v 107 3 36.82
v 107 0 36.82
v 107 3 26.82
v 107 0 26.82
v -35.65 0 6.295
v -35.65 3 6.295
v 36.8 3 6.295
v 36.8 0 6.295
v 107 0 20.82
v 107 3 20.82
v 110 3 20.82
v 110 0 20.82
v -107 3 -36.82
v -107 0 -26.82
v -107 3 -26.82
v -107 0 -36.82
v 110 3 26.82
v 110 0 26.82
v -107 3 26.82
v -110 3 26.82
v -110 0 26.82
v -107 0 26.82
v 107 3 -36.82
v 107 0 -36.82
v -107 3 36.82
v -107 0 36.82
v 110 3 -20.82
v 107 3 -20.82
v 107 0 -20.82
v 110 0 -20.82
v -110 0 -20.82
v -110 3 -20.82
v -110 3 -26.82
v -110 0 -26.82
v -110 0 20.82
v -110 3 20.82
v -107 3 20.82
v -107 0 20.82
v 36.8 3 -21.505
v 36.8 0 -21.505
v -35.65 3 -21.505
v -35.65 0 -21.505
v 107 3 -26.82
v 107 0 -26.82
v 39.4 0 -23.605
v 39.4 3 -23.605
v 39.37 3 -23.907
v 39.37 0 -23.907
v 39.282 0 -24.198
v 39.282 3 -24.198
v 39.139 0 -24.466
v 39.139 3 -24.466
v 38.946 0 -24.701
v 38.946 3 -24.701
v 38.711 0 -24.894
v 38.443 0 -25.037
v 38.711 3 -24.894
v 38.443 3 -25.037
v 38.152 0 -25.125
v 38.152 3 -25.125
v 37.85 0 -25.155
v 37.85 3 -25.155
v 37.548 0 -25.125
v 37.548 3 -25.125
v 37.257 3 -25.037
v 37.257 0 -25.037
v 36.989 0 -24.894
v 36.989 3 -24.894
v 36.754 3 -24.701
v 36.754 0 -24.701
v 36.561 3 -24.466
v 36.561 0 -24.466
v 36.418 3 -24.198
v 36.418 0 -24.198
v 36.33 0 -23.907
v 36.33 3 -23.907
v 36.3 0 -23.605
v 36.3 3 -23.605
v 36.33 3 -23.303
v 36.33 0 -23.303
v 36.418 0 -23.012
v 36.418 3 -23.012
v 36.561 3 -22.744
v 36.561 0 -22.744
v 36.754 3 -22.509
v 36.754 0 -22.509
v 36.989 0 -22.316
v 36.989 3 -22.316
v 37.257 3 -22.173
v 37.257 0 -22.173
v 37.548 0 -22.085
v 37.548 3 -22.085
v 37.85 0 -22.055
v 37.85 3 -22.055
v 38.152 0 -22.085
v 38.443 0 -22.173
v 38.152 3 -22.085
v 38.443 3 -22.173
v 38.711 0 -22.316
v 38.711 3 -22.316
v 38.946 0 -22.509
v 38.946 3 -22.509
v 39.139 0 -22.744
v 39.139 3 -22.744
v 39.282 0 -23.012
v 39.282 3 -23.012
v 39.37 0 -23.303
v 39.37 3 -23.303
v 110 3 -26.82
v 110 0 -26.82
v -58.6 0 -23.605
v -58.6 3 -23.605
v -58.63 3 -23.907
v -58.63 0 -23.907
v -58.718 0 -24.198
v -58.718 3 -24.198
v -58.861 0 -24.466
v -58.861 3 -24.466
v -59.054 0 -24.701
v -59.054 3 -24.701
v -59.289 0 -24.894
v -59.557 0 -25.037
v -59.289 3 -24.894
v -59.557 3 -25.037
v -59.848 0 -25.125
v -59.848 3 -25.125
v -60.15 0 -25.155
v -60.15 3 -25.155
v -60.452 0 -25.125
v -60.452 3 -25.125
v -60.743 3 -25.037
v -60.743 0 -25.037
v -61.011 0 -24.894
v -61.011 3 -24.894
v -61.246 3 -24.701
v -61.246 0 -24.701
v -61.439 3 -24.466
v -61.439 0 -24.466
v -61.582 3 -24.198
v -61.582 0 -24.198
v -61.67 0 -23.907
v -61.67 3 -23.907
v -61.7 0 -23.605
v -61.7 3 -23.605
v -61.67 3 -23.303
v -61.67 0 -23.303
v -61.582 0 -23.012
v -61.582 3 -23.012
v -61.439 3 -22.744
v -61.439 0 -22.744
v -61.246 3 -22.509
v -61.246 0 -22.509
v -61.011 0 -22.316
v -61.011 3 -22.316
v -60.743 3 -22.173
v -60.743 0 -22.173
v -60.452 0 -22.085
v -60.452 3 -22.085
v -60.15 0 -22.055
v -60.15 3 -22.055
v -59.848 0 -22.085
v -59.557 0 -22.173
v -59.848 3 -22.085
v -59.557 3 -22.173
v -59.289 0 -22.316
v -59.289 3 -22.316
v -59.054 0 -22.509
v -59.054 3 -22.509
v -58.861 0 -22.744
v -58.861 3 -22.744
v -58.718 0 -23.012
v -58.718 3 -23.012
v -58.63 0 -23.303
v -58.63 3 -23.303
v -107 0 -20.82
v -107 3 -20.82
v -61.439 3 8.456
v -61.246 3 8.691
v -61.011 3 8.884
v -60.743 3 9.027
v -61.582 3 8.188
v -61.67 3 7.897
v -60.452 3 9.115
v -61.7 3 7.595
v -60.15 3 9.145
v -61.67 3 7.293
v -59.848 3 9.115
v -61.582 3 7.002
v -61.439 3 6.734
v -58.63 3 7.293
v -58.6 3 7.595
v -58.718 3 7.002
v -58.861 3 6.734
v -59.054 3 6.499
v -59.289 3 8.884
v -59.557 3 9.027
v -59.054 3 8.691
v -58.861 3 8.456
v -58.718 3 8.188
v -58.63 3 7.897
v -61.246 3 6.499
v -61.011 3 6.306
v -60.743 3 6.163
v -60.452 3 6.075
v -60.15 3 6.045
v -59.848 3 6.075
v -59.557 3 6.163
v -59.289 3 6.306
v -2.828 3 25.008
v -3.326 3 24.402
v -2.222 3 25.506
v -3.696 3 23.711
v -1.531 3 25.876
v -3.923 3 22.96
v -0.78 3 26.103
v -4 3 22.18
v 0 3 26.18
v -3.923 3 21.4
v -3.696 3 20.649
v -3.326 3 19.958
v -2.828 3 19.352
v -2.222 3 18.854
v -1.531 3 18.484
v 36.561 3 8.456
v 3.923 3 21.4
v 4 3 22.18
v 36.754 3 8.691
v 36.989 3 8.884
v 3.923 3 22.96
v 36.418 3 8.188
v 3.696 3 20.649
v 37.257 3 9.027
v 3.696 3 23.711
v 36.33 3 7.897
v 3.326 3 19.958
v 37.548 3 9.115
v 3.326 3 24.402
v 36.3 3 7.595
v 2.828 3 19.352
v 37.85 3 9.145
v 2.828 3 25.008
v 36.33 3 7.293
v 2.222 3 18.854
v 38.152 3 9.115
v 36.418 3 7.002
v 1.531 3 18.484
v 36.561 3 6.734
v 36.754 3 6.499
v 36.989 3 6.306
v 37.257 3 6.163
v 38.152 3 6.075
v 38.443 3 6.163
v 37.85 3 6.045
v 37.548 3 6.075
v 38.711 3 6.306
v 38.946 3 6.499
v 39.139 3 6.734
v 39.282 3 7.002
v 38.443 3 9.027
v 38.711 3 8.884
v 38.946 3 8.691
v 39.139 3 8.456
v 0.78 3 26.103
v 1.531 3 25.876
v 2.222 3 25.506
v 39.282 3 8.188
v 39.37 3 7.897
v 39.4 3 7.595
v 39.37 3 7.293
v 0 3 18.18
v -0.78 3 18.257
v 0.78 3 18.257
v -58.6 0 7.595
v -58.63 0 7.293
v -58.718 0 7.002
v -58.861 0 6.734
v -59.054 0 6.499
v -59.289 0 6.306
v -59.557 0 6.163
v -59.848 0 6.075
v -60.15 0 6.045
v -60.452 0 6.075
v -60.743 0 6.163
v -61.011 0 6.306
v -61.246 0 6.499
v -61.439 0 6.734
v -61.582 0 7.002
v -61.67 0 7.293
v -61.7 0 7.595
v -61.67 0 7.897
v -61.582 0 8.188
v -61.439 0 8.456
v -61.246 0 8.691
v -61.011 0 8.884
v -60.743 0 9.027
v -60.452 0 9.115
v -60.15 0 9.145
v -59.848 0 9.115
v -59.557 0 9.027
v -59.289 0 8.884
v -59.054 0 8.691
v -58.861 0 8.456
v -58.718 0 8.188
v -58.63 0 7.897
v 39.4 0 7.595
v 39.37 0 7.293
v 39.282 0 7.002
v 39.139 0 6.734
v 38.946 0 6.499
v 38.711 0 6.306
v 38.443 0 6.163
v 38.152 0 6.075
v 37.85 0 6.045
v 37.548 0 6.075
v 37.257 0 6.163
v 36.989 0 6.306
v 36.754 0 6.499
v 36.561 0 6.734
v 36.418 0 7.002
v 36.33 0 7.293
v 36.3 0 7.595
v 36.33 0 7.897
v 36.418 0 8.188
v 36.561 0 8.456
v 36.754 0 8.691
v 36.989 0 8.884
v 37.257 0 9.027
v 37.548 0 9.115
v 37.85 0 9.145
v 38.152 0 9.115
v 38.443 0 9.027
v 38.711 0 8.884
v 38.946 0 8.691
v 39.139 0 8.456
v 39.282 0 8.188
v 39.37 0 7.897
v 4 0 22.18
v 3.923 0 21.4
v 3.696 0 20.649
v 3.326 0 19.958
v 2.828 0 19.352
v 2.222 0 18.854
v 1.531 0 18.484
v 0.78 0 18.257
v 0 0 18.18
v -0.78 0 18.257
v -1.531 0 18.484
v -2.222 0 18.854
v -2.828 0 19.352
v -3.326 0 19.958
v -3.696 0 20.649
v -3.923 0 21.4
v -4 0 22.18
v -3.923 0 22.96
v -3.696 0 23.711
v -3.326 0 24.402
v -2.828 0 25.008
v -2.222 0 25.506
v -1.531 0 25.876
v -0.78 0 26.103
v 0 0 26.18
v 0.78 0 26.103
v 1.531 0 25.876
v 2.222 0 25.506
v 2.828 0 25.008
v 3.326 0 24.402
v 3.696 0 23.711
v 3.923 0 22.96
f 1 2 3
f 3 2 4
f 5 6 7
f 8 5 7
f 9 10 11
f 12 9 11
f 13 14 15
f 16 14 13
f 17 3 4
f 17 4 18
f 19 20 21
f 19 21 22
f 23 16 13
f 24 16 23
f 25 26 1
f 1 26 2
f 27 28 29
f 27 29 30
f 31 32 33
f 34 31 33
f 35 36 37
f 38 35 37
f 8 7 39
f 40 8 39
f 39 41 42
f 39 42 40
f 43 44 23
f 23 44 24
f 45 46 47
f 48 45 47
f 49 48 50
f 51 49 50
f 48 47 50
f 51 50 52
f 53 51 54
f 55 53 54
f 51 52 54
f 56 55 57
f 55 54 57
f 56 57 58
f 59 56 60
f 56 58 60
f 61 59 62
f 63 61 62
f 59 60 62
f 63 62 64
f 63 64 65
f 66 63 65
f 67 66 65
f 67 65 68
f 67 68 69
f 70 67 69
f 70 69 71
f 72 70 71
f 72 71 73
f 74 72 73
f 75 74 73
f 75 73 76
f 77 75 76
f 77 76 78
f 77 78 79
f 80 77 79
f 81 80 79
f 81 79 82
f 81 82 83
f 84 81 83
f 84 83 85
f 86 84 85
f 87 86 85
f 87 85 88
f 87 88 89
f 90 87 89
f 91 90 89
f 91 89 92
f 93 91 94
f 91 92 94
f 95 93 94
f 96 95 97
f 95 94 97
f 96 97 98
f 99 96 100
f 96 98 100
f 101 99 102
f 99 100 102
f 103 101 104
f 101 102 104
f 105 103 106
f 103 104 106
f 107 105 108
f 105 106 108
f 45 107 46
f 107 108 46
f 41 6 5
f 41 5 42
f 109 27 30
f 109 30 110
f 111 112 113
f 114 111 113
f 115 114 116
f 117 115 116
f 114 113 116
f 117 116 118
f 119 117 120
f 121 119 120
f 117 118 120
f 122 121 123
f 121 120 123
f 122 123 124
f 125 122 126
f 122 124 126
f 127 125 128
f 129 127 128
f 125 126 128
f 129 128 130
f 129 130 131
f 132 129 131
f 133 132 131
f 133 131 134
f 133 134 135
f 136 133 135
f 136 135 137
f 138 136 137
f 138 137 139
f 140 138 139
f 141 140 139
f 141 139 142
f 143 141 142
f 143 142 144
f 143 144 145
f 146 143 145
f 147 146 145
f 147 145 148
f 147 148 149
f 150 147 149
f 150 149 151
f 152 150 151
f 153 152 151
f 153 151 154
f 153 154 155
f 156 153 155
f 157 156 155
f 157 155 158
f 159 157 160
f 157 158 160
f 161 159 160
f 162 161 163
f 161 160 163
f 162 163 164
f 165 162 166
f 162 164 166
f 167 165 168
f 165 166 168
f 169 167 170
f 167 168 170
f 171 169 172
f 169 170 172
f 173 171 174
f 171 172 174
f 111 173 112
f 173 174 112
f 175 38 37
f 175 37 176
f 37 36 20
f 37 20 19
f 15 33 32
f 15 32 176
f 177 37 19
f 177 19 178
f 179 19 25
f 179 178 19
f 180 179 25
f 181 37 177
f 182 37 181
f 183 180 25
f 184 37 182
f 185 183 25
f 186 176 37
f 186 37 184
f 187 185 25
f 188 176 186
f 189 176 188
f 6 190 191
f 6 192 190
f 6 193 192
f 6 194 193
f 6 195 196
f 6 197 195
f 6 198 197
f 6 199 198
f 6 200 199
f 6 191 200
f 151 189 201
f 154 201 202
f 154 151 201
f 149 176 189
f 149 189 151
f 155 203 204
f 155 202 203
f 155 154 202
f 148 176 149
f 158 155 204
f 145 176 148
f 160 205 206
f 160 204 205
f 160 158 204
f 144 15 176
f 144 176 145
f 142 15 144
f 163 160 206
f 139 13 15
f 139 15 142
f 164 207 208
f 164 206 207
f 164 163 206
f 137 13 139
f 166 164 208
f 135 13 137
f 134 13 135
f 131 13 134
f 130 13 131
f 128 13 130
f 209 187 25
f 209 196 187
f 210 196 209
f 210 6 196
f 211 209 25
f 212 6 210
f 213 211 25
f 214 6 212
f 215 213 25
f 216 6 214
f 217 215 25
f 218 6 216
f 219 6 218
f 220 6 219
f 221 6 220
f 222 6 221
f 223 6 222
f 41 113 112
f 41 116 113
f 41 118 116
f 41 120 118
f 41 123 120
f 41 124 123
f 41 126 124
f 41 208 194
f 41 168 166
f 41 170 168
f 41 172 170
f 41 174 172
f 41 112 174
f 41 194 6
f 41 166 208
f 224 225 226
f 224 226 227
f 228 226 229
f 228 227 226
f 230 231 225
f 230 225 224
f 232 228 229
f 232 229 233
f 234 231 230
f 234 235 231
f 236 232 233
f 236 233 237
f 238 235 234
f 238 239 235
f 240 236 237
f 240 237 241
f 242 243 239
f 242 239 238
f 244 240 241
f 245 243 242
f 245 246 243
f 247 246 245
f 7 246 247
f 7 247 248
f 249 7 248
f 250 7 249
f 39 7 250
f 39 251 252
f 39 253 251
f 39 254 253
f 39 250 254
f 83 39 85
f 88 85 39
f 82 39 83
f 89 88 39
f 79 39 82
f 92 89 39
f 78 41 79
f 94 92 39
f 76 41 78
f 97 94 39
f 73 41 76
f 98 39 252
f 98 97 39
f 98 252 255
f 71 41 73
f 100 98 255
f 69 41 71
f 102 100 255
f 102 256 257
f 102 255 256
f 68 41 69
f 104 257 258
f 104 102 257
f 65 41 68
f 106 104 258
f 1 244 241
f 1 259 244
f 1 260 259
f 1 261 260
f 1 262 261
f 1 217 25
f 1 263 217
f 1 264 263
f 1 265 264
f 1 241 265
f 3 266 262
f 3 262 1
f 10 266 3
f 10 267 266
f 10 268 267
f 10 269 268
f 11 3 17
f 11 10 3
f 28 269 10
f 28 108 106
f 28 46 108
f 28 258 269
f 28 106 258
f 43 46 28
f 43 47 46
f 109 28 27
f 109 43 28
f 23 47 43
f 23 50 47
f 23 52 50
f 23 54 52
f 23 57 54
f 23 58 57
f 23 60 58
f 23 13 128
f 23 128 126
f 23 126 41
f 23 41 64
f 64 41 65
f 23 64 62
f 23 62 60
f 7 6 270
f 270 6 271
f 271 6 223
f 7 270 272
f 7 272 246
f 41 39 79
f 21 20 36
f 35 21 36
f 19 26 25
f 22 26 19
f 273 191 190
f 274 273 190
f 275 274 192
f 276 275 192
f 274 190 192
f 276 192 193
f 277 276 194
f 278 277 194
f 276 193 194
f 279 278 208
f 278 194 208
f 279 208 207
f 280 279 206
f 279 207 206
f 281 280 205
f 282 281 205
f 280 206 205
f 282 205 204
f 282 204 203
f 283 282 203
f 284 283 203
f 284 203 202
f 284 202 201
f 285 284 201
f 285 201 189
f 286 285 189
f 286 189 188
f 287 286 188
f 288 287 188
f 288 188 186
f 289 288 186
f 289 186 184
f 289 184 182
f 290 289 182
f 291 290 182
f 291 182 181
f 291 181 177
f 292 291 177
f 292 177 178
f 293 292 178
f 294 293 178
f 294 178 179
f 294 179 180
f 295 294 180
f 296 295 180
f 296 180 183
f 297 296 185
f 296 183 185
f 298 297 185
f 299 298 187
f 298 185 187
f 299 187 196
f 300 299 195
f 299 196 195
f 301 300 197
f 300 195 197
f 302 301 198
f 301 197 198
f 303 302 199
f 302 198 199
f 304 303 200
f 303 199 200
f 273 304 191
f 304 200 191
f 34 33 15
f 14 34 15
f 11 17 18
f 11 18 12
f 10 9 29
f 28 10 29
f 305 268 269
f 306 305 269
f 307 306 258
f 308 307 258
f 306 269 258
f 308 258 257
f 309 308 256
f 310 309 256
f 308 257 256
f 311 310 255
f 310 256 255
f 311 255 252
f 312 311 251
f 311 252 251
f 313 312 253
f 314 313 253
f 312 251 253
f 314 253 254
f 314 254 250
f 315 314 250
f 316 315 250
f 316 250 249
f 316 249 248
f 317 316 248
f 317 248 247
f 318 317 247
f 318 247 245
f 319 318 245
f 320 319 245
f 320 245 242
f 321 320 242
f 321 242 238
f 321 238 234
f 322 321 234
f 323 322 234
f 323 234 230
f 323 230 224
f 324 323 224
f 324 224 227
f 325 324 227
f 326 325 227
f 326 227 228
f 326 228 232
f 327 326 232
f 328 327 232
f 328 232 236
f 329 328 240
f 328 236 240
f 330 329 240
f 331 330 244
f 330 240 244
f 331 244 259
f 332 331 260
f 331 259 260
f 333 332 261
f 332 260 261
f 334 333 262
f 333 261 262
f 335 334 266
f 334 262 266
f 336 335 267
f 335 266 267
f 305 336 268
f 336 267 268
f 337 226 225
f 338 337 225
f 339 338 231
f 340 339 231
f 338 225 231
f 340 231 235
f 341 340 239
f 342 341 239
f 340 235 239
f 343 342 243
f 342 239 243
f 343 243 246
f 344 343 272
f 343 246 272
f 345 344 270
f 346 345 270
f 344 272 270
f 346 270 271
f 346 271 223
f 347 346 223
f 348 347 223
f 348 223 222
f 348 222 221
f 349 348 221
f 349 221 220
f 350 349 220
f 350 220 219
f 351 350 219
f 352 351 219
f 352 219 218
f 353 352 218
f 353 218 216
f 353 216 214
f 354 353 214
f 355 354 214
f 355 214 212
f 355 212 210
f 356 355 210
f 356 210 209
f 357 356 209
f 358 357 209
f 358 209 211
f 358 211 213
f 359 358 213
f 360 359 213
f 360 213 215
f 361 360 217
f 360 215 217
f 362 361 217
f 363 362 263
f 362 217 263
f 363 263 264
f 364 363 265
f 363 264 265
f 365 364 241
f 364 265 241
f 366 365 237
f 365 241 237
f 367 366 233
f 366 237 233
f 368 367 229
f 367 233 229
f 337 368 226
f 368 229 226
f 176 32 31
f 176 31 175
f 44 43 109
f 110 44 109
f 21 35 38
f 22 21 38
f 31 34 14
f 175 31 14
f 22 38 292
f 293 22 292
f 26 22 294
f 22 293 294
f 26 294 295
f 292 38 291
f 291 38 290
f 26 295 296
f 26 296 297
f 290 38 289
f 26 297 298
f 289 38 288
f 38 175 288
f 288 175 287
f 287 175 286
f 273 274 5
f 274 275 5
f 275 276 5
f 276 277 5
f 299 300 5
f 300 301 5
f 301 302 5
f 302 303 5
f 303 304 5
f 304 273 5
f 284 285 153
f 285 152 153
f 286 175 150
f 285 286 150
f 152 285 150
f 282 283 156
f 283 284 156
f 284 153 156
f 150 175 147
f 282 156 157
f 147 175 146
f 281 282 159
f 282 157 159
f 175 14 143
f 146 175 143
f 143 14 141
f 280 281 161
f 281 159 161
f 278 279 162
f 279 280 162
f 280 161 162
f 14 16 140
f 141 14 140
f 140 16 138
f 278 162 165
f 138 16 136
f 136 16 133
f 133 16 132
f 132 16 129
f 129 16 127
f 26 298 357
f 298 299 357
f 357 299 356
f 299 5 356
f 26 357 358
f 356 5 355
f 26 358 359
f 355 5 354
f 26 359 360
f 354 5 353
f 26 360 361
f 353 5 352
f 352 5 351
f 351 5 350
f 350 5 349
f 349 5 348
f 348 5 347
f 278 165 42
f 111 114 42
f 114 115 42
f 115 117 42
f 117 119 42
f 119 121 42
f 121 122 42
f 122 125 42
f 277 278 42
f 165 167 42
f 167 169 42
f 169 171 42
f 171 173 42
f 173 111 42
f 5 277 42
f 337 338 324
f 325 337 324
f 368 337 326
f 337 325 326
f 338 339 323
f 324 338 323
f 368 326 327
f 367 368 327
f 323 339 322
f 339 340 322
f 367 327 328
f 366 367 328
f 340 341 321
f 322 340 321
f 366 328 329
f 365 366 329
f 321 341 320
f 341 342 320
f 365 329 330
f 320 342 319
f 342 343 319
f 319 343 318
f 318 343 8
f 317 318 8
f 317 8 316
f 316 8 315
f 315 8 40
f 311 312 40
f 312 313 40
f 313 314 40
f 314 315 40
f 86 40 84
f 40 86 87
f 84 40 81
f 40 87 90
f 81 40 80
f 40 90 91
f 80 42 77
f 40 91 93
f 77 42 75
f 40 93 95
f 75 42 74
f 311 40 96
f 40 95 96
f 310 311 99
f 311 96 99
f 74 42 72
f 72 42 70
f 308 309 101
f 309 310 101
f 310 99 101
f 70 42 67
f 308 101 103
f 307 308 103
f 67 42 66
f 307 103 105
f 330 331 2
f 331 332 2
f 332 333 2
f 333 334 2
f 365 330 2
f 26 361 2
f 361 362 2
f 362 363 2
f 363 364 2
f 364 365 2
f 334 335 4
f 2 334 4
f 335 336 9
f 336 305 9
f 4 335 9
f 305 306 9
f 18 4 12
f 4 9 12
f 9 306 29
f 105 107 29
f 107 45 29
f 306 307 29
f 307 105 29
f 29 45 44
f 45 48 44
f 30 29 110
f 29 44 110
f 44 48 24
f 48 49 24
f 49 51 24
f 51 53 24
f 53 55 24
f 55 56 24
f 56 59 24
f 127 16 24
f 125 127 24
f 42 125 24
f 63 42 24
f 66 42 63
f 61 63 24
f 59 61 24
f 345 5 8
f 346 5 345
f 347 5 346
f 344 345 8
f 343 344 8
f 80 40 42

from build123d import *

# Parameters (mm, degrees)
CROQUIS1_W              = 214
CROQUIS1_H              = 73.64
SALIENTE_EXTRUIR1_DEPTH = 3
CROQUIS3_W              = 3
CROQUIS3_H              = 6
SALIENTE_EXTRUIR2_DEPTH = 3
CROQUIS2_R              = 4
CORTAR_EXTRUIR1_DEPTH   = 4
CROQUIS5_R              = 1.55
CORTAR_EXTRUIR3_DEPTH   = 4
CROQUIS6_W              = 72.45
CROQUIS6_H              = 27.8
CORTAR_EXTRUIR4_DEPTH   = 4


with BuildPart() as part:
    # Croquis1 → Saliente-Extruir1 (new body)
    with BuildSketch(Plane(origin=(0, 0, 0), x_dir=(1, 0, 0), z_dir=(0, 1, 0))):
        Rectangle(CROQUIS1_W, CROQUIS1_H)
    extrude(amount=SALIENTE_EXTRUIR1_DEPTH)

    # Croquis3 → Saliente-Extruir2 (add, through all)
    with BuildSketch(Plane(origin=(0, 3, 0), x_dir=(1, 0, 0), z_dir=(0, 1, 0))):
        with Locations((-108.5, 23.82)):
            Rectangle(CROQUIS3_W, CROQUIS3_H)
        with Locations((-108.5, -23.82)):
            Rectangle(CROQUIS3_W, CROQUIS3_H)
        with Locations((108.5, 23.82)):
            Rectangle(CROQUIS3_W, CROQUIS3_H)
        with Locations((108.5, -23.82)):
            Rectangle(CROQUIS3_W, CROQUIS3_H)
    extrude(amount=-SALIENTE_EXTRUIR2_DEPTH)

    # Croquis2 → Cortar-Extruir1 (cut, through all)
    with BuildSketch(Plane(origin=(0, 3, 0), x_dir=(1, 0, 0), z_dir=(0, 1, 0))):
        with Locations((0, -22.18)):
            Circle(CROQUIS2_R)
    extrude(amount=-CORTAR_EXTRUIR1_DEPTH, mode=Mode.SUBTRACT)

    # Croquis5 → Cortar-Extruir3 (cut, through all)
    with BuildSketch(Plane(origin=(0, 3, 0), x_dir=(1, 0, 0), z_dir=(0, 1, 0))):
        with Locations((-60.15, 23.604994207)):
            Circle(CROQUIS5_R)
        with Locations((37.85, 23.604994207)):
            Circle(CROQUIS5_R)
        with Locations((37.85, -7.595005793)):
            Circle(CROQUIS5_R)
        with Locations((-60.15, -7.595005793)):
            Circle(CROQUIS5_R)
    extrude(amount=-CORTAR_EXTRUIR3_DEPTH, mode=Mode.SUBTRACT)

    # Croquis6 → Cortar-Extruir4 (cut, through all)
    with BuildSketch(Plane(origin=(0, 3, 0), x_dir=(1, 0, 0), z_dir=(0, 1, 0))):
        with Locations((0.575, 7.604994207)):
            Rectangle(CROQUIS6_W, CROQUIS6_H)
    extrude(amount=-CORTAR_EXTRUIR4_DEPTH, mode=Mode.SUBTRACT)


solid = part.part
